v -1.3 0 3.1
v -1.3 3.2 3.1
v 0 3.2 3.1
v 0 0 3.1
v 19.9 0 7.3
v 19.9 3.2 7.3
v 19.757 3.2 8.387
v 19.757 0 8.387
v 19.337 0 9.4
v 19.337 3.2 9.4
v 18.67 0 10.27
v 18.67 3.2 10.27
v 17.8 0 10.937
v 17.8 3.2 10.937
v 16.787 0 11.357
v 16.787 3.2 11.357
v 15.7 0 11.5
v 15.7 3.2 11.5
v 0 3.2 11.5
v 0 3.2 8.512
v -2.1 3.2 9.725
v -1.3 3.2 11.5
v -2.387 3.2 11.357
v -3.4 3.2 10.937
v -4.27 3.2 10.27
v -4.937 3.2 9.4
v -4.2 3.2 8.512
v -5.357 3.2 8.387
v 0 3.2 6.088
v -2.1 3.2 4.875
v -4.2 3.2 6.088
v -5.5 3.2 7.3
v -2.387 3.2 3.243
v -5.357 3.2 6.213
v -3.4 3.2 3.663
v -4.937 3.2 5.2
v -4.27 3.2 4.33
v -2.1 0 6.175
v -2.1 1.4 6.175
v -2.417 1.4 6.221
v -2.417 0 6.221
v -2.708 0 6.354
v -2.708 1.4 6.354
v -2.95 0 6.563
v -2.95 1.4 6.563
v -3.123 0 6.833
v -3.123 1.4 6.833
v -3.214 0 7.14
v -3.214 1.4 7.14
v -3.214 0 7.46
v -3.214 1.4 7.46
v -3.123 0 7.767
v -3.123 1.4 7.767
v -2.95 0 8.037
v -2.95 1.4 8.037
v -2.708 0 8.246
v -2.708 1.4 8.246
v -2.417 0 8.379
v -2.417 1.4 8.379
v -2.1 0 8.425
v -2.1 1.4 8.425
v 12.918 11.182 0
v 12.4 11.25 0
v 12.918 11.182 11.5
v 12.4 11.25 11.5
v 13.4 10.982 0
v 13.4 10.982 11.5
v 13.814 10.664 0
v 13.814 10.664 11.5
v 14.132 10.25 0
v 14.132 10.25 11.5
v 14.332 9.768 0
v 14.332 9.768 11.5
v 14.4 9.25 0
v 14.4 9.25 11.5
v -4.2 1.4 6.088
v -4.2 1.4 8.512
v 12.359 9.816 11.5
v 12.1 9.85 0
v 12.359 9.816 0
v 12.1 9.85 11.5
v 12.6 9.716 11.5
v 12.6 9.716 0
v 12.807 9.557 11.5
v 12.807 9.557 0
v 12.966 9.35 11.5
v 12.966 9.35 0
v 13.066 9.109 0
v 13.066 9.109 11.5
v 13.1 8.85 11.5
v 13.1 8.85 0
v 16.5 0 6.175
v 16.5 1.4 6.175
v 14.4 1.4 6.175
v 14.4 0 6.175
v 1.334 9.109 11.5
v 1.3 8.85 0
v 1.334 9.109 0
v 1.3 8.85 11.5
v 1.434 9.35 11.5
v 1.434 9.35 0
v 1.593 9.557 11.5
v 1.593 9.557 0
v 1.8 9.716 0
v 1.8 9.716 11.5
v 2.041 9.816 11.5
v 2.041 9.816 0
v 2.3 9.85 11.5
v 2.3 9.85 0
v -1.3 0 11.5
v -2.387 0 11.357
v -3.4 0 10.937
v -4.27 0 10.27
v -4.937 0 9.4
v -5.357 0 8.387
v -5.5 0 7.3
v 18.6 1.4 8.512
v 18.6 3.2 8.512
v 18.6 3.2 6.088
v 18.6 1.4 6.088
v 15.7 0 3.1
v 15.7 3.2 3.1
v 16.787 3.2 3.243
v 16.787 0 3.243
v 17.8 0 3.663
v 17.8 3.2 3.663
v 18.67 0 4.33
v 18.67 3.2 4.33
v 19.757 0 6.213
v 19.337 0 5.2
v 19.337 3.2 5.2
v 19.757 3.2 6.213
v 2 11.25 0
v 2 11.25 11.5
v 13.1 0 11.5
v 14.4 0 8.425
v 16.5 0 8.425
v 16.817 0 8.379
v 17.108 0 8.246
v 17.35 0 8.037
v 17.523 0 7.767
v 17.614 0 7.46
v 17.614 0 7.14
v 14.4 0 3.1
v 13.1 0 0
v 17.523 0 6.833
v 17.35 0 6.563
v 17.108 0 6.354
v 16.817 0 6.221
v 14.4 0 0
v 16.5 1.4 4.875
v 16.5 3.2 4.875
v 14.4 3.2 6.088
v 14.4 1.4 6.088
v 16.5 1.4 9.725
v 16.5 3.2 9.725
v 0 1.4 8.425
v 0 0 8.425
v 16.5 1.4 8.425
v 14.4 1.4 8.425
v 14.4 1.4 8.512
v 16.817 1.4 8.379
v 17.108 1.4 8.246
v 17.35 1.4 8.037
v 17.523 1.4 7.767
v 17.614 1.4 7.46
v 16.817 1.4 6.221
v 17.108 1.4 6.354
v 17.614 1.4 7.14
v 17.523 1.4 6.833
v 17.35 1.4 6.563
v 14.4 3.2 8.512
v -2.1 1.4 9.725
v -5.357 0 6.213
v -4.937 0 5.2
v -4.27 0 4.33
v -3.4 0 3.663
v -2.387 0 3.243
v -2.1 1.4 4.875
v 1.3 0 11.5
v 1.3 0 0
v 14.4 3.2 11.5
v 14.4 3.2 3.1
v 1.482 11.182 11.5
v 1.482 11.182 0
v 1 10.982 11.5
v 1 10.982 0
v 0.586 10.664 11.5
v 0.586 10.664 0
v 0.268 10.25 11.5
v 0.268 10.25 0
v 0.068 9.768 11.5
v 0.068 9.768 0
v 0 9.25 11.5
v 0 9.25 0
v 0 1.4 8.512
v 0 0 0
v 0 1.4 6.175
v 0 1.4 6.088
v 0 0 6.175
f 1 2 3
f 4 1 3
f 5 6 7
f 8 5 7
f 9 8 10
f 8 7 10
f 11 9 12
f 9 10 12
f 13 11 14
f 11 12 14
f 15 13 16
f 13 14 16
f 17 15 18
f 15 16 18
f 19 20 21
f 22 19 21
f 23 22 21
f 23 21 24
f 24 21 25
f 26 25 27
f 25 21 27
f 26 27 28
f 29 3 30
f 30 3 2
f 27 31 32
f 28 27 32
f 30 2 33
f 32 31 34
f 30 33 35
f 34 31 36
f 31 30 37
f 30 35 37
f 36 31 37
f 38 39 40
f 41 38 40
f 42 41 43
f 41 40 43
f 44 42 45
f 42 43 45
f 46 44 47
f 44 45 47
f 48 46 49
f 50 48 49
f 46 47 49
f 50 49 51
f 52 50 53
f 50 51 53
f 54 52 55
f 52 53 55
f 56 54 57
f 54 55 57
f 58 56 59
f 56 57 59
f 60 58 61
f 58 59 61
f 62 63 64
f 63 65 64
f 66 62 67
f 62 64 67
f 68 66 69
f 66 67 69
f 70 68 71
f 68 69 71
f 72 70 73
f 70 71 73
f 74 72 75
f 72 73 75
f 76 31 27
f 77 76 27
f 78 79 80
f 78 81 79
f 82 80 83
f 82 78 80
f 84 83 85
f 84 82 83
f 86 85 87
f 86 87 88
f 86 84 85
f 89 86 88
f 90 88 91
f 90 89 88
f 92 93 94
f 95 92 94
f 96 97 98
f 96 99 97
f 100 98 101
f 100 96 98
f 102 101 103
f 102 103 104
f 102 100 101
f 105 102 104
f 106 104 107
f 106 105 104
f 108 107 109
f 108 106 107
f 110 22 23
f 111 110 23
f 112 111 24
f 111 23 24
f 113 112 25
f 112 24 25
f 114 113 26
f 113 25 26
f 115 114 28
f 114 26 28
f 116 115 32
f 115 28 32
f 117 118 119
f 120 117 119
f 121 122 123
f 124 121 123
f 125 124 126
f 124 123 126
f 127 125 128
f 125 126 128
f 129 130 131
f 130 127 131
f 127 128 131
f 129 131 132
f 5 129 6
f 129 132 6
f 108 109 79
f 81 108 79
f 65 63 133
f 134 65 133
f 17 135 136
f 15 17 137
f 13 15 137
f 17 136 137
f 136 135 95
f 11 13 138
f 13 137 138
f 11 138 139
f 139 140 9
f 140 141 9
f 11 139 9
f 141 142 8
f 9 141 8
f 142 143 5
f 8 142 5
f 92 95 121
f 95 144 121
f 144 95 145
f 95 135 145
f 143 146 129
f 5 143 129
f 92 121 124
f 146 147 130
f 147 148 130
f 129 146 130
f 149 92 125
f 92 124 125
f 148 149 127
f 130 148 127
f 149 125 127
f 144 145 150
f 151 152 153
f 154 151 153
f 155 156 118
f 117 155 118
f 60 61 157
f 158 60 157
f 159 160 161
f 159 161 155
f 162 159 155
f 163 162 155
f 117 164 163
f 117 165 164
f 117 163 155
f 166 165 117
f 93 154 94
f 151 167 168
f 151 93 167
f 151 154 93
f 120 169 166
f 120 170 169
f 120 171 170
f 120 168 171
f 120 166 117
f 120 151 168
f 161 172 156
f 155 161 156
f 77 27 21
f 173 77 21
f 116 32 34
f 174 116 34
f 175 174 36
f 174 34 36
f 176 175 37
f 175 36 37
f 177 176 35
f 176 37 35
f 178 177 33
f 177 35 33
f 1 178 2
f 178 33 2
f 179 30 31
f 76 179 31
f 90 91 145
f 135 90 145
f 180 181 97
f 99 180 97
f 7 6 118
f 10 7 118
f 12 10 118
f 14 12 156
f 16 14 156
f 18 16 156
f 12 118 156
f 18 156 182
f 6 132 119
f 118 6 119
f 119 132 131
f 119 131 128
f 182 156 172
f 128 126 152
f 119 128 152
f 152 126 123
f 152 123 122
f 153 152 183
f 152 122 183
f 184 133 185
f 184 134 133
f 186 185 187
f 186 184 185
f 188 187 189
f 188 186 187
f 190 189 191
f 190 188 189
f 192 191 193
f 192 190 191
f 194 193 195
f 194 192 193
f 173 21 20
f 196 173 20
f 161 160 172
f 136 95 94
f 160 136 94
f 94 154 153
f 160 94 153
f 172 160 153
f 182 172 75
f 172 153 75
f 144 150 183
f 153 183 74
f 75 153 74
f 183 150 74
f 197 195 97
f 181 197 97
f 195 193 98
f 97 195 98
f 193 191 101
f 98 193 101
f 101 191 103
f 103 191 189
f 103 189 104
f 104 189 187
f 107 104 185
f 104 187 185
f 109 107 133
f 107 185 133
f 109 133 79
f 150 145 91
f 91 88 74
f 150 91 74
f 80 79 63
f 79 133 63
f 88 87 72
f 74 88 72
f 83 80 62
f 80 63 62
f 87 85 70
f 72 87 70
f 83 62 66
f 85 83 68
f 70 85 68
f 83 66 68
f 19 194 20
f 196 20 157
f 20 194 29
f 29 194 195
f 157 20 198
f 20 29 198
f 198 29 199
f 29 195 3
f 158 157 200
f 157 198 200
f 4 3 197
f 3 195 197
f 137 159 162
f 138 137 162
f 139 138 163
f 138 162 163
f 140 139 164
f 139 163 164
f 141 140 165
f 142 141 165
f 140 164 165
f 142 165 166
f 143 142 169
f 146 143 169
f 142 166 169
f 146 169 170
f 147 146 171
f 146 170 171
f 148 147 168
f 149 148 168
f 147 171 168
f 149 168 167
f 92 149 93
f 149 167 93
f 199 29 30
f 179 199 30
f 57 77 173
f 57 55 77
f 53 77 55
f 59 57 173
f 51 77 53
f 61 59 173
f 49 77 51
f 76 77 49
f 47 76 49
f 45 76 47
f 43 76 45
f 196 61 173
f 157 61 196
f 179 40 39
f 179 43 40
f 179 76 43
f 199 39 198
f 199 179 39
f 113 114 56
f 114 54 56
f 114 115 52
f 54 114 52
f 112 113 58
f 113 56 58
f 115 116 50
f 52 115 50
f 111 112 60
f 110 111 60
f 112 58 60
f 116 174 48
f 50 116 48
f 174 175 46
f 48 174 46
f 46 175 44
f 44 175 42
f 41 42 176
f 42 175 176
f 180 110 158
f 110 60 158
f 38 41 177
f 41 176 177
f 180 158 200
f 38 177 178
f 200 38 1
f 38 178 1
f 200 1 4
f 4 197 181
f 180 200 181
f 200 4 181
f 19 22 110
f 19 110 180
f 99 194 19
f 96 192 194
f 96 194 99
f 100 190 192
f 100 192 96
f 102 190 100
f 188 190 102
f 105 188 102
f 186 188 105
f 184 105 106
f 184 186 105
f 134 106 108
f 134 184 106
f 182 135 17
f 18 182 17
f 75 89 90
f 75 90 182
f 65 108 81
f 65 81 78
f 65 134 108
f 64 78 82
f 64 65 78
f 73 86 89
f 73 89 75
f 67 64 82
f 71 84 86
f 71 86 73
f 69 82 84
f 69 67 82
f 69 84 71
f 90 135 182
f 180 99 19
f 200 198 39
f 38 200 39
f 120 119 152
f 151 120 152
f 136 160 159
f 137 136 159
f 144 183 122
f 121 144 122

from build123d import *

# Parameters (mm, degrees)
EXTRUDE_1_DEPTH     = 11.5
CUT_EXTRUDE_1_DEPTH = 11.5
CUT_EXTRUDE_2_DEPTH = 11.5
CUT_EXTRUDE_3_DEPTH = 1.8
CUT_EXTRUDE_4_DEPTH = 1.8
CUT_EXTRUDE_5_DEPTH = 1.8
CUT_EXTRUDE_6_DEPTH = 1.8
FILLET_1_R          = 2
FILLET_2_R          = 2
FILLET_3_R          = 1
FILLET_4_R          = 1


with BuildPart() as part:
    # 草图1 → 凸台-拉伸1 (new body)
    with BuildSketch(Plane.XY):
        Polygon((14.4, 3.2), (14.4, 11.25), (0, 11.25), (0, 3.2), (-5.5, 3.2), (-5.5, 0), (0, 0), (1.3, 0), (1.3, 9.85), (13.1, 9.85), (13.1, 0), (14.4, 0), (19.9, 0), (19.9, 3.2), align=None)
    extrude(amount=EXTRUDE_1_DEPTH)

    # 草图2 → 切除-拉伸1 (cut)
    with BuildSketch(Plane(origin=(0, 3.2, 0), x_dir=(1, 0, 0), z_dir=(0, 1, 0))):
        with BuildLine():
            Line((14.4, 0), (14.4, -3.1))
            Line((14.4, -3.1), (15.7, -3.1))
            ThreePointArc((15.7, -3.1), (18.669848481, -4.330151519), (19.9, -7.3))
            Line((19.9, -7.3), (19.9, 0))
            Line((19.9, 0), (14.4, 0))
        make_face()
        with BuildLine():
            ThreePointArc((19.9, -7.3), (18.669848481, -10.269848481), (15.7, -11.5))
            Line((15.7, -11.5), (19.9, -11.5))
            Line((19.9, -11.5), (19.9, -7.3))
        make_face()
    extrude(amount=-CUT_EXTRUDE_1_DEPTH, mode=Mode.SUBTRACT)

    # 草图3 → 切除-拉伸2 (cut)
    with BuildSketch(Plane(origin=(0, 3.2, 0), x_dir=(1, 0, 0), z_dir=(0, 1, 0))):
        with BuildLine():
            Line((-1.3, -3.1), (0, -3.1))
            Line((0, -3.1), (0, 0))
            Line((0, 0), (-5.5, 0))
            Line((-5.5, 0), (-5.5, -7.3))
            ThreePointArc((-5.5, -7.3), (-4.269848481, -4.330151519), (-1.3, -3.1))
        make_face()
        with BuildLine():
            Line((-5.5, -11.5), (-1.3, -11.5))
            ThreePointArc((-1.3, -11.5), (-4.269848481, -10.269848481), (-5.5, -7.3))
            Line((-5.5, -7.3), (-5.5, -11.5))
        make_face()
    extrude(amount=-CUT_EXTRUDE_2_DEPTH, mode=Mode.SUBTRACT)

    # 草图5 → 切除-拉伸3 (cut)
    with BuildSketch(Plane(origin=(0, 3.2, 0), x_dir=(1, 0, 0), z_dir=(0, 1, 0))):
        Polygon((18.6, -6.087564435), (16.5, -4.875128869), (14.4, -6.087564435), (14.4, -8.512435565), (16.5, -9.724871131), (18.6, -8.512435565), align=None)
    extrude(amount=-CUT_EXTRUDE_3_DEPTH, mode=Mode.SUBTRACT)

    # 草图8 → 切除-拉伸4 (cut)
    with BuildSketch(Plane(origin=(0, 3.2, 0), x_dir=(1, 0, 0), z_dir=(0, 1, 0))):
        Polygon((-4.2, -6.087564435), (-4.2, -8.512435565), (-2.1, -9.724871131), (0, -8.512435565), (0, -6.087564435), (-2.1, -4.875128869), align=None)
    extrude(amount=-CUT_EXTRUDE_4_DEPTH, mode=Mode.SUBTRACT)

    # 草图10 → 切除-拉伸5 (cut)
    with BuildSketch(Plane(origin=(0, 1.4, 0), x_dir=(1, 0, 0), z_dir=(0, 1, 0))):
        with BuildLine():
            Line((0, -8.425), (0, -6.175))
            Line((0, -6.175), (-2.1, -6.175))
            ThreePointArc((-2.1, -6.175), (-3.225, -7.3), (-2.1, -8.425))
            Line((-2.1, -8.425), (0, -8.425))
        make_face()
    extrude(amount=-CUT_EXTRUDE_5_DEPTH, mode=Mode.SUBTRACT)

    # 草图7 → 切除-拉伸6 (cut)
    with BuildSketch(Plane(origin=(0, 1.4, 0), x_dir=(1, 0, 0), z_dir=(0, 1, 0))):
        with BuildLine():
            Line((14.4, -6.175), (14.4, -8.425))
            Line((14.4, -8.425), (16.5, -8.425))
            ThreePointArc((16.5, -8.425), (17.625, -7.3), (16.5, -6.175))
            Line((16.5, -6.175), (14.4, -6.175))
        make_face()
    extrude(amount=-CUT_EXTRUDE_6_DEPTH, mode=Mode.SUBTRACT)

    # 圆角1
    fillet_1_edges = [part.edges().sort_by_distance(p)[0] for p in [
        (0, 11.25, 5.75),
    ]]
    fillet(fillet_1_edges, radius=FILLET_1_R)

    # 圆角2
    fillet_2_edges = [part.edges().sort_by_distance(p)[0] for p in [
        (14.4, 11.25, 5.75),
    ]]
    fillet(fillet_2_edges, radius=FILLET_2_R)

    # 圆角3
    fillet_3_edges = [part.edges().sort_by_distance(p)[0] for p in [
        (1.3, 9.85, 5.75),
    ]]
    fillet(fillet_3_edges, radius=FILLET_3_R)

    # 圆角4
    fillet_4_edges = [part.edges().sort_by_distance(p)[0] for p in [
        (13.1, 9.85, 5.75),
    ]]
    fillet(fillet_4_edges, radius=FILLET_4_R)


solid = part.part
